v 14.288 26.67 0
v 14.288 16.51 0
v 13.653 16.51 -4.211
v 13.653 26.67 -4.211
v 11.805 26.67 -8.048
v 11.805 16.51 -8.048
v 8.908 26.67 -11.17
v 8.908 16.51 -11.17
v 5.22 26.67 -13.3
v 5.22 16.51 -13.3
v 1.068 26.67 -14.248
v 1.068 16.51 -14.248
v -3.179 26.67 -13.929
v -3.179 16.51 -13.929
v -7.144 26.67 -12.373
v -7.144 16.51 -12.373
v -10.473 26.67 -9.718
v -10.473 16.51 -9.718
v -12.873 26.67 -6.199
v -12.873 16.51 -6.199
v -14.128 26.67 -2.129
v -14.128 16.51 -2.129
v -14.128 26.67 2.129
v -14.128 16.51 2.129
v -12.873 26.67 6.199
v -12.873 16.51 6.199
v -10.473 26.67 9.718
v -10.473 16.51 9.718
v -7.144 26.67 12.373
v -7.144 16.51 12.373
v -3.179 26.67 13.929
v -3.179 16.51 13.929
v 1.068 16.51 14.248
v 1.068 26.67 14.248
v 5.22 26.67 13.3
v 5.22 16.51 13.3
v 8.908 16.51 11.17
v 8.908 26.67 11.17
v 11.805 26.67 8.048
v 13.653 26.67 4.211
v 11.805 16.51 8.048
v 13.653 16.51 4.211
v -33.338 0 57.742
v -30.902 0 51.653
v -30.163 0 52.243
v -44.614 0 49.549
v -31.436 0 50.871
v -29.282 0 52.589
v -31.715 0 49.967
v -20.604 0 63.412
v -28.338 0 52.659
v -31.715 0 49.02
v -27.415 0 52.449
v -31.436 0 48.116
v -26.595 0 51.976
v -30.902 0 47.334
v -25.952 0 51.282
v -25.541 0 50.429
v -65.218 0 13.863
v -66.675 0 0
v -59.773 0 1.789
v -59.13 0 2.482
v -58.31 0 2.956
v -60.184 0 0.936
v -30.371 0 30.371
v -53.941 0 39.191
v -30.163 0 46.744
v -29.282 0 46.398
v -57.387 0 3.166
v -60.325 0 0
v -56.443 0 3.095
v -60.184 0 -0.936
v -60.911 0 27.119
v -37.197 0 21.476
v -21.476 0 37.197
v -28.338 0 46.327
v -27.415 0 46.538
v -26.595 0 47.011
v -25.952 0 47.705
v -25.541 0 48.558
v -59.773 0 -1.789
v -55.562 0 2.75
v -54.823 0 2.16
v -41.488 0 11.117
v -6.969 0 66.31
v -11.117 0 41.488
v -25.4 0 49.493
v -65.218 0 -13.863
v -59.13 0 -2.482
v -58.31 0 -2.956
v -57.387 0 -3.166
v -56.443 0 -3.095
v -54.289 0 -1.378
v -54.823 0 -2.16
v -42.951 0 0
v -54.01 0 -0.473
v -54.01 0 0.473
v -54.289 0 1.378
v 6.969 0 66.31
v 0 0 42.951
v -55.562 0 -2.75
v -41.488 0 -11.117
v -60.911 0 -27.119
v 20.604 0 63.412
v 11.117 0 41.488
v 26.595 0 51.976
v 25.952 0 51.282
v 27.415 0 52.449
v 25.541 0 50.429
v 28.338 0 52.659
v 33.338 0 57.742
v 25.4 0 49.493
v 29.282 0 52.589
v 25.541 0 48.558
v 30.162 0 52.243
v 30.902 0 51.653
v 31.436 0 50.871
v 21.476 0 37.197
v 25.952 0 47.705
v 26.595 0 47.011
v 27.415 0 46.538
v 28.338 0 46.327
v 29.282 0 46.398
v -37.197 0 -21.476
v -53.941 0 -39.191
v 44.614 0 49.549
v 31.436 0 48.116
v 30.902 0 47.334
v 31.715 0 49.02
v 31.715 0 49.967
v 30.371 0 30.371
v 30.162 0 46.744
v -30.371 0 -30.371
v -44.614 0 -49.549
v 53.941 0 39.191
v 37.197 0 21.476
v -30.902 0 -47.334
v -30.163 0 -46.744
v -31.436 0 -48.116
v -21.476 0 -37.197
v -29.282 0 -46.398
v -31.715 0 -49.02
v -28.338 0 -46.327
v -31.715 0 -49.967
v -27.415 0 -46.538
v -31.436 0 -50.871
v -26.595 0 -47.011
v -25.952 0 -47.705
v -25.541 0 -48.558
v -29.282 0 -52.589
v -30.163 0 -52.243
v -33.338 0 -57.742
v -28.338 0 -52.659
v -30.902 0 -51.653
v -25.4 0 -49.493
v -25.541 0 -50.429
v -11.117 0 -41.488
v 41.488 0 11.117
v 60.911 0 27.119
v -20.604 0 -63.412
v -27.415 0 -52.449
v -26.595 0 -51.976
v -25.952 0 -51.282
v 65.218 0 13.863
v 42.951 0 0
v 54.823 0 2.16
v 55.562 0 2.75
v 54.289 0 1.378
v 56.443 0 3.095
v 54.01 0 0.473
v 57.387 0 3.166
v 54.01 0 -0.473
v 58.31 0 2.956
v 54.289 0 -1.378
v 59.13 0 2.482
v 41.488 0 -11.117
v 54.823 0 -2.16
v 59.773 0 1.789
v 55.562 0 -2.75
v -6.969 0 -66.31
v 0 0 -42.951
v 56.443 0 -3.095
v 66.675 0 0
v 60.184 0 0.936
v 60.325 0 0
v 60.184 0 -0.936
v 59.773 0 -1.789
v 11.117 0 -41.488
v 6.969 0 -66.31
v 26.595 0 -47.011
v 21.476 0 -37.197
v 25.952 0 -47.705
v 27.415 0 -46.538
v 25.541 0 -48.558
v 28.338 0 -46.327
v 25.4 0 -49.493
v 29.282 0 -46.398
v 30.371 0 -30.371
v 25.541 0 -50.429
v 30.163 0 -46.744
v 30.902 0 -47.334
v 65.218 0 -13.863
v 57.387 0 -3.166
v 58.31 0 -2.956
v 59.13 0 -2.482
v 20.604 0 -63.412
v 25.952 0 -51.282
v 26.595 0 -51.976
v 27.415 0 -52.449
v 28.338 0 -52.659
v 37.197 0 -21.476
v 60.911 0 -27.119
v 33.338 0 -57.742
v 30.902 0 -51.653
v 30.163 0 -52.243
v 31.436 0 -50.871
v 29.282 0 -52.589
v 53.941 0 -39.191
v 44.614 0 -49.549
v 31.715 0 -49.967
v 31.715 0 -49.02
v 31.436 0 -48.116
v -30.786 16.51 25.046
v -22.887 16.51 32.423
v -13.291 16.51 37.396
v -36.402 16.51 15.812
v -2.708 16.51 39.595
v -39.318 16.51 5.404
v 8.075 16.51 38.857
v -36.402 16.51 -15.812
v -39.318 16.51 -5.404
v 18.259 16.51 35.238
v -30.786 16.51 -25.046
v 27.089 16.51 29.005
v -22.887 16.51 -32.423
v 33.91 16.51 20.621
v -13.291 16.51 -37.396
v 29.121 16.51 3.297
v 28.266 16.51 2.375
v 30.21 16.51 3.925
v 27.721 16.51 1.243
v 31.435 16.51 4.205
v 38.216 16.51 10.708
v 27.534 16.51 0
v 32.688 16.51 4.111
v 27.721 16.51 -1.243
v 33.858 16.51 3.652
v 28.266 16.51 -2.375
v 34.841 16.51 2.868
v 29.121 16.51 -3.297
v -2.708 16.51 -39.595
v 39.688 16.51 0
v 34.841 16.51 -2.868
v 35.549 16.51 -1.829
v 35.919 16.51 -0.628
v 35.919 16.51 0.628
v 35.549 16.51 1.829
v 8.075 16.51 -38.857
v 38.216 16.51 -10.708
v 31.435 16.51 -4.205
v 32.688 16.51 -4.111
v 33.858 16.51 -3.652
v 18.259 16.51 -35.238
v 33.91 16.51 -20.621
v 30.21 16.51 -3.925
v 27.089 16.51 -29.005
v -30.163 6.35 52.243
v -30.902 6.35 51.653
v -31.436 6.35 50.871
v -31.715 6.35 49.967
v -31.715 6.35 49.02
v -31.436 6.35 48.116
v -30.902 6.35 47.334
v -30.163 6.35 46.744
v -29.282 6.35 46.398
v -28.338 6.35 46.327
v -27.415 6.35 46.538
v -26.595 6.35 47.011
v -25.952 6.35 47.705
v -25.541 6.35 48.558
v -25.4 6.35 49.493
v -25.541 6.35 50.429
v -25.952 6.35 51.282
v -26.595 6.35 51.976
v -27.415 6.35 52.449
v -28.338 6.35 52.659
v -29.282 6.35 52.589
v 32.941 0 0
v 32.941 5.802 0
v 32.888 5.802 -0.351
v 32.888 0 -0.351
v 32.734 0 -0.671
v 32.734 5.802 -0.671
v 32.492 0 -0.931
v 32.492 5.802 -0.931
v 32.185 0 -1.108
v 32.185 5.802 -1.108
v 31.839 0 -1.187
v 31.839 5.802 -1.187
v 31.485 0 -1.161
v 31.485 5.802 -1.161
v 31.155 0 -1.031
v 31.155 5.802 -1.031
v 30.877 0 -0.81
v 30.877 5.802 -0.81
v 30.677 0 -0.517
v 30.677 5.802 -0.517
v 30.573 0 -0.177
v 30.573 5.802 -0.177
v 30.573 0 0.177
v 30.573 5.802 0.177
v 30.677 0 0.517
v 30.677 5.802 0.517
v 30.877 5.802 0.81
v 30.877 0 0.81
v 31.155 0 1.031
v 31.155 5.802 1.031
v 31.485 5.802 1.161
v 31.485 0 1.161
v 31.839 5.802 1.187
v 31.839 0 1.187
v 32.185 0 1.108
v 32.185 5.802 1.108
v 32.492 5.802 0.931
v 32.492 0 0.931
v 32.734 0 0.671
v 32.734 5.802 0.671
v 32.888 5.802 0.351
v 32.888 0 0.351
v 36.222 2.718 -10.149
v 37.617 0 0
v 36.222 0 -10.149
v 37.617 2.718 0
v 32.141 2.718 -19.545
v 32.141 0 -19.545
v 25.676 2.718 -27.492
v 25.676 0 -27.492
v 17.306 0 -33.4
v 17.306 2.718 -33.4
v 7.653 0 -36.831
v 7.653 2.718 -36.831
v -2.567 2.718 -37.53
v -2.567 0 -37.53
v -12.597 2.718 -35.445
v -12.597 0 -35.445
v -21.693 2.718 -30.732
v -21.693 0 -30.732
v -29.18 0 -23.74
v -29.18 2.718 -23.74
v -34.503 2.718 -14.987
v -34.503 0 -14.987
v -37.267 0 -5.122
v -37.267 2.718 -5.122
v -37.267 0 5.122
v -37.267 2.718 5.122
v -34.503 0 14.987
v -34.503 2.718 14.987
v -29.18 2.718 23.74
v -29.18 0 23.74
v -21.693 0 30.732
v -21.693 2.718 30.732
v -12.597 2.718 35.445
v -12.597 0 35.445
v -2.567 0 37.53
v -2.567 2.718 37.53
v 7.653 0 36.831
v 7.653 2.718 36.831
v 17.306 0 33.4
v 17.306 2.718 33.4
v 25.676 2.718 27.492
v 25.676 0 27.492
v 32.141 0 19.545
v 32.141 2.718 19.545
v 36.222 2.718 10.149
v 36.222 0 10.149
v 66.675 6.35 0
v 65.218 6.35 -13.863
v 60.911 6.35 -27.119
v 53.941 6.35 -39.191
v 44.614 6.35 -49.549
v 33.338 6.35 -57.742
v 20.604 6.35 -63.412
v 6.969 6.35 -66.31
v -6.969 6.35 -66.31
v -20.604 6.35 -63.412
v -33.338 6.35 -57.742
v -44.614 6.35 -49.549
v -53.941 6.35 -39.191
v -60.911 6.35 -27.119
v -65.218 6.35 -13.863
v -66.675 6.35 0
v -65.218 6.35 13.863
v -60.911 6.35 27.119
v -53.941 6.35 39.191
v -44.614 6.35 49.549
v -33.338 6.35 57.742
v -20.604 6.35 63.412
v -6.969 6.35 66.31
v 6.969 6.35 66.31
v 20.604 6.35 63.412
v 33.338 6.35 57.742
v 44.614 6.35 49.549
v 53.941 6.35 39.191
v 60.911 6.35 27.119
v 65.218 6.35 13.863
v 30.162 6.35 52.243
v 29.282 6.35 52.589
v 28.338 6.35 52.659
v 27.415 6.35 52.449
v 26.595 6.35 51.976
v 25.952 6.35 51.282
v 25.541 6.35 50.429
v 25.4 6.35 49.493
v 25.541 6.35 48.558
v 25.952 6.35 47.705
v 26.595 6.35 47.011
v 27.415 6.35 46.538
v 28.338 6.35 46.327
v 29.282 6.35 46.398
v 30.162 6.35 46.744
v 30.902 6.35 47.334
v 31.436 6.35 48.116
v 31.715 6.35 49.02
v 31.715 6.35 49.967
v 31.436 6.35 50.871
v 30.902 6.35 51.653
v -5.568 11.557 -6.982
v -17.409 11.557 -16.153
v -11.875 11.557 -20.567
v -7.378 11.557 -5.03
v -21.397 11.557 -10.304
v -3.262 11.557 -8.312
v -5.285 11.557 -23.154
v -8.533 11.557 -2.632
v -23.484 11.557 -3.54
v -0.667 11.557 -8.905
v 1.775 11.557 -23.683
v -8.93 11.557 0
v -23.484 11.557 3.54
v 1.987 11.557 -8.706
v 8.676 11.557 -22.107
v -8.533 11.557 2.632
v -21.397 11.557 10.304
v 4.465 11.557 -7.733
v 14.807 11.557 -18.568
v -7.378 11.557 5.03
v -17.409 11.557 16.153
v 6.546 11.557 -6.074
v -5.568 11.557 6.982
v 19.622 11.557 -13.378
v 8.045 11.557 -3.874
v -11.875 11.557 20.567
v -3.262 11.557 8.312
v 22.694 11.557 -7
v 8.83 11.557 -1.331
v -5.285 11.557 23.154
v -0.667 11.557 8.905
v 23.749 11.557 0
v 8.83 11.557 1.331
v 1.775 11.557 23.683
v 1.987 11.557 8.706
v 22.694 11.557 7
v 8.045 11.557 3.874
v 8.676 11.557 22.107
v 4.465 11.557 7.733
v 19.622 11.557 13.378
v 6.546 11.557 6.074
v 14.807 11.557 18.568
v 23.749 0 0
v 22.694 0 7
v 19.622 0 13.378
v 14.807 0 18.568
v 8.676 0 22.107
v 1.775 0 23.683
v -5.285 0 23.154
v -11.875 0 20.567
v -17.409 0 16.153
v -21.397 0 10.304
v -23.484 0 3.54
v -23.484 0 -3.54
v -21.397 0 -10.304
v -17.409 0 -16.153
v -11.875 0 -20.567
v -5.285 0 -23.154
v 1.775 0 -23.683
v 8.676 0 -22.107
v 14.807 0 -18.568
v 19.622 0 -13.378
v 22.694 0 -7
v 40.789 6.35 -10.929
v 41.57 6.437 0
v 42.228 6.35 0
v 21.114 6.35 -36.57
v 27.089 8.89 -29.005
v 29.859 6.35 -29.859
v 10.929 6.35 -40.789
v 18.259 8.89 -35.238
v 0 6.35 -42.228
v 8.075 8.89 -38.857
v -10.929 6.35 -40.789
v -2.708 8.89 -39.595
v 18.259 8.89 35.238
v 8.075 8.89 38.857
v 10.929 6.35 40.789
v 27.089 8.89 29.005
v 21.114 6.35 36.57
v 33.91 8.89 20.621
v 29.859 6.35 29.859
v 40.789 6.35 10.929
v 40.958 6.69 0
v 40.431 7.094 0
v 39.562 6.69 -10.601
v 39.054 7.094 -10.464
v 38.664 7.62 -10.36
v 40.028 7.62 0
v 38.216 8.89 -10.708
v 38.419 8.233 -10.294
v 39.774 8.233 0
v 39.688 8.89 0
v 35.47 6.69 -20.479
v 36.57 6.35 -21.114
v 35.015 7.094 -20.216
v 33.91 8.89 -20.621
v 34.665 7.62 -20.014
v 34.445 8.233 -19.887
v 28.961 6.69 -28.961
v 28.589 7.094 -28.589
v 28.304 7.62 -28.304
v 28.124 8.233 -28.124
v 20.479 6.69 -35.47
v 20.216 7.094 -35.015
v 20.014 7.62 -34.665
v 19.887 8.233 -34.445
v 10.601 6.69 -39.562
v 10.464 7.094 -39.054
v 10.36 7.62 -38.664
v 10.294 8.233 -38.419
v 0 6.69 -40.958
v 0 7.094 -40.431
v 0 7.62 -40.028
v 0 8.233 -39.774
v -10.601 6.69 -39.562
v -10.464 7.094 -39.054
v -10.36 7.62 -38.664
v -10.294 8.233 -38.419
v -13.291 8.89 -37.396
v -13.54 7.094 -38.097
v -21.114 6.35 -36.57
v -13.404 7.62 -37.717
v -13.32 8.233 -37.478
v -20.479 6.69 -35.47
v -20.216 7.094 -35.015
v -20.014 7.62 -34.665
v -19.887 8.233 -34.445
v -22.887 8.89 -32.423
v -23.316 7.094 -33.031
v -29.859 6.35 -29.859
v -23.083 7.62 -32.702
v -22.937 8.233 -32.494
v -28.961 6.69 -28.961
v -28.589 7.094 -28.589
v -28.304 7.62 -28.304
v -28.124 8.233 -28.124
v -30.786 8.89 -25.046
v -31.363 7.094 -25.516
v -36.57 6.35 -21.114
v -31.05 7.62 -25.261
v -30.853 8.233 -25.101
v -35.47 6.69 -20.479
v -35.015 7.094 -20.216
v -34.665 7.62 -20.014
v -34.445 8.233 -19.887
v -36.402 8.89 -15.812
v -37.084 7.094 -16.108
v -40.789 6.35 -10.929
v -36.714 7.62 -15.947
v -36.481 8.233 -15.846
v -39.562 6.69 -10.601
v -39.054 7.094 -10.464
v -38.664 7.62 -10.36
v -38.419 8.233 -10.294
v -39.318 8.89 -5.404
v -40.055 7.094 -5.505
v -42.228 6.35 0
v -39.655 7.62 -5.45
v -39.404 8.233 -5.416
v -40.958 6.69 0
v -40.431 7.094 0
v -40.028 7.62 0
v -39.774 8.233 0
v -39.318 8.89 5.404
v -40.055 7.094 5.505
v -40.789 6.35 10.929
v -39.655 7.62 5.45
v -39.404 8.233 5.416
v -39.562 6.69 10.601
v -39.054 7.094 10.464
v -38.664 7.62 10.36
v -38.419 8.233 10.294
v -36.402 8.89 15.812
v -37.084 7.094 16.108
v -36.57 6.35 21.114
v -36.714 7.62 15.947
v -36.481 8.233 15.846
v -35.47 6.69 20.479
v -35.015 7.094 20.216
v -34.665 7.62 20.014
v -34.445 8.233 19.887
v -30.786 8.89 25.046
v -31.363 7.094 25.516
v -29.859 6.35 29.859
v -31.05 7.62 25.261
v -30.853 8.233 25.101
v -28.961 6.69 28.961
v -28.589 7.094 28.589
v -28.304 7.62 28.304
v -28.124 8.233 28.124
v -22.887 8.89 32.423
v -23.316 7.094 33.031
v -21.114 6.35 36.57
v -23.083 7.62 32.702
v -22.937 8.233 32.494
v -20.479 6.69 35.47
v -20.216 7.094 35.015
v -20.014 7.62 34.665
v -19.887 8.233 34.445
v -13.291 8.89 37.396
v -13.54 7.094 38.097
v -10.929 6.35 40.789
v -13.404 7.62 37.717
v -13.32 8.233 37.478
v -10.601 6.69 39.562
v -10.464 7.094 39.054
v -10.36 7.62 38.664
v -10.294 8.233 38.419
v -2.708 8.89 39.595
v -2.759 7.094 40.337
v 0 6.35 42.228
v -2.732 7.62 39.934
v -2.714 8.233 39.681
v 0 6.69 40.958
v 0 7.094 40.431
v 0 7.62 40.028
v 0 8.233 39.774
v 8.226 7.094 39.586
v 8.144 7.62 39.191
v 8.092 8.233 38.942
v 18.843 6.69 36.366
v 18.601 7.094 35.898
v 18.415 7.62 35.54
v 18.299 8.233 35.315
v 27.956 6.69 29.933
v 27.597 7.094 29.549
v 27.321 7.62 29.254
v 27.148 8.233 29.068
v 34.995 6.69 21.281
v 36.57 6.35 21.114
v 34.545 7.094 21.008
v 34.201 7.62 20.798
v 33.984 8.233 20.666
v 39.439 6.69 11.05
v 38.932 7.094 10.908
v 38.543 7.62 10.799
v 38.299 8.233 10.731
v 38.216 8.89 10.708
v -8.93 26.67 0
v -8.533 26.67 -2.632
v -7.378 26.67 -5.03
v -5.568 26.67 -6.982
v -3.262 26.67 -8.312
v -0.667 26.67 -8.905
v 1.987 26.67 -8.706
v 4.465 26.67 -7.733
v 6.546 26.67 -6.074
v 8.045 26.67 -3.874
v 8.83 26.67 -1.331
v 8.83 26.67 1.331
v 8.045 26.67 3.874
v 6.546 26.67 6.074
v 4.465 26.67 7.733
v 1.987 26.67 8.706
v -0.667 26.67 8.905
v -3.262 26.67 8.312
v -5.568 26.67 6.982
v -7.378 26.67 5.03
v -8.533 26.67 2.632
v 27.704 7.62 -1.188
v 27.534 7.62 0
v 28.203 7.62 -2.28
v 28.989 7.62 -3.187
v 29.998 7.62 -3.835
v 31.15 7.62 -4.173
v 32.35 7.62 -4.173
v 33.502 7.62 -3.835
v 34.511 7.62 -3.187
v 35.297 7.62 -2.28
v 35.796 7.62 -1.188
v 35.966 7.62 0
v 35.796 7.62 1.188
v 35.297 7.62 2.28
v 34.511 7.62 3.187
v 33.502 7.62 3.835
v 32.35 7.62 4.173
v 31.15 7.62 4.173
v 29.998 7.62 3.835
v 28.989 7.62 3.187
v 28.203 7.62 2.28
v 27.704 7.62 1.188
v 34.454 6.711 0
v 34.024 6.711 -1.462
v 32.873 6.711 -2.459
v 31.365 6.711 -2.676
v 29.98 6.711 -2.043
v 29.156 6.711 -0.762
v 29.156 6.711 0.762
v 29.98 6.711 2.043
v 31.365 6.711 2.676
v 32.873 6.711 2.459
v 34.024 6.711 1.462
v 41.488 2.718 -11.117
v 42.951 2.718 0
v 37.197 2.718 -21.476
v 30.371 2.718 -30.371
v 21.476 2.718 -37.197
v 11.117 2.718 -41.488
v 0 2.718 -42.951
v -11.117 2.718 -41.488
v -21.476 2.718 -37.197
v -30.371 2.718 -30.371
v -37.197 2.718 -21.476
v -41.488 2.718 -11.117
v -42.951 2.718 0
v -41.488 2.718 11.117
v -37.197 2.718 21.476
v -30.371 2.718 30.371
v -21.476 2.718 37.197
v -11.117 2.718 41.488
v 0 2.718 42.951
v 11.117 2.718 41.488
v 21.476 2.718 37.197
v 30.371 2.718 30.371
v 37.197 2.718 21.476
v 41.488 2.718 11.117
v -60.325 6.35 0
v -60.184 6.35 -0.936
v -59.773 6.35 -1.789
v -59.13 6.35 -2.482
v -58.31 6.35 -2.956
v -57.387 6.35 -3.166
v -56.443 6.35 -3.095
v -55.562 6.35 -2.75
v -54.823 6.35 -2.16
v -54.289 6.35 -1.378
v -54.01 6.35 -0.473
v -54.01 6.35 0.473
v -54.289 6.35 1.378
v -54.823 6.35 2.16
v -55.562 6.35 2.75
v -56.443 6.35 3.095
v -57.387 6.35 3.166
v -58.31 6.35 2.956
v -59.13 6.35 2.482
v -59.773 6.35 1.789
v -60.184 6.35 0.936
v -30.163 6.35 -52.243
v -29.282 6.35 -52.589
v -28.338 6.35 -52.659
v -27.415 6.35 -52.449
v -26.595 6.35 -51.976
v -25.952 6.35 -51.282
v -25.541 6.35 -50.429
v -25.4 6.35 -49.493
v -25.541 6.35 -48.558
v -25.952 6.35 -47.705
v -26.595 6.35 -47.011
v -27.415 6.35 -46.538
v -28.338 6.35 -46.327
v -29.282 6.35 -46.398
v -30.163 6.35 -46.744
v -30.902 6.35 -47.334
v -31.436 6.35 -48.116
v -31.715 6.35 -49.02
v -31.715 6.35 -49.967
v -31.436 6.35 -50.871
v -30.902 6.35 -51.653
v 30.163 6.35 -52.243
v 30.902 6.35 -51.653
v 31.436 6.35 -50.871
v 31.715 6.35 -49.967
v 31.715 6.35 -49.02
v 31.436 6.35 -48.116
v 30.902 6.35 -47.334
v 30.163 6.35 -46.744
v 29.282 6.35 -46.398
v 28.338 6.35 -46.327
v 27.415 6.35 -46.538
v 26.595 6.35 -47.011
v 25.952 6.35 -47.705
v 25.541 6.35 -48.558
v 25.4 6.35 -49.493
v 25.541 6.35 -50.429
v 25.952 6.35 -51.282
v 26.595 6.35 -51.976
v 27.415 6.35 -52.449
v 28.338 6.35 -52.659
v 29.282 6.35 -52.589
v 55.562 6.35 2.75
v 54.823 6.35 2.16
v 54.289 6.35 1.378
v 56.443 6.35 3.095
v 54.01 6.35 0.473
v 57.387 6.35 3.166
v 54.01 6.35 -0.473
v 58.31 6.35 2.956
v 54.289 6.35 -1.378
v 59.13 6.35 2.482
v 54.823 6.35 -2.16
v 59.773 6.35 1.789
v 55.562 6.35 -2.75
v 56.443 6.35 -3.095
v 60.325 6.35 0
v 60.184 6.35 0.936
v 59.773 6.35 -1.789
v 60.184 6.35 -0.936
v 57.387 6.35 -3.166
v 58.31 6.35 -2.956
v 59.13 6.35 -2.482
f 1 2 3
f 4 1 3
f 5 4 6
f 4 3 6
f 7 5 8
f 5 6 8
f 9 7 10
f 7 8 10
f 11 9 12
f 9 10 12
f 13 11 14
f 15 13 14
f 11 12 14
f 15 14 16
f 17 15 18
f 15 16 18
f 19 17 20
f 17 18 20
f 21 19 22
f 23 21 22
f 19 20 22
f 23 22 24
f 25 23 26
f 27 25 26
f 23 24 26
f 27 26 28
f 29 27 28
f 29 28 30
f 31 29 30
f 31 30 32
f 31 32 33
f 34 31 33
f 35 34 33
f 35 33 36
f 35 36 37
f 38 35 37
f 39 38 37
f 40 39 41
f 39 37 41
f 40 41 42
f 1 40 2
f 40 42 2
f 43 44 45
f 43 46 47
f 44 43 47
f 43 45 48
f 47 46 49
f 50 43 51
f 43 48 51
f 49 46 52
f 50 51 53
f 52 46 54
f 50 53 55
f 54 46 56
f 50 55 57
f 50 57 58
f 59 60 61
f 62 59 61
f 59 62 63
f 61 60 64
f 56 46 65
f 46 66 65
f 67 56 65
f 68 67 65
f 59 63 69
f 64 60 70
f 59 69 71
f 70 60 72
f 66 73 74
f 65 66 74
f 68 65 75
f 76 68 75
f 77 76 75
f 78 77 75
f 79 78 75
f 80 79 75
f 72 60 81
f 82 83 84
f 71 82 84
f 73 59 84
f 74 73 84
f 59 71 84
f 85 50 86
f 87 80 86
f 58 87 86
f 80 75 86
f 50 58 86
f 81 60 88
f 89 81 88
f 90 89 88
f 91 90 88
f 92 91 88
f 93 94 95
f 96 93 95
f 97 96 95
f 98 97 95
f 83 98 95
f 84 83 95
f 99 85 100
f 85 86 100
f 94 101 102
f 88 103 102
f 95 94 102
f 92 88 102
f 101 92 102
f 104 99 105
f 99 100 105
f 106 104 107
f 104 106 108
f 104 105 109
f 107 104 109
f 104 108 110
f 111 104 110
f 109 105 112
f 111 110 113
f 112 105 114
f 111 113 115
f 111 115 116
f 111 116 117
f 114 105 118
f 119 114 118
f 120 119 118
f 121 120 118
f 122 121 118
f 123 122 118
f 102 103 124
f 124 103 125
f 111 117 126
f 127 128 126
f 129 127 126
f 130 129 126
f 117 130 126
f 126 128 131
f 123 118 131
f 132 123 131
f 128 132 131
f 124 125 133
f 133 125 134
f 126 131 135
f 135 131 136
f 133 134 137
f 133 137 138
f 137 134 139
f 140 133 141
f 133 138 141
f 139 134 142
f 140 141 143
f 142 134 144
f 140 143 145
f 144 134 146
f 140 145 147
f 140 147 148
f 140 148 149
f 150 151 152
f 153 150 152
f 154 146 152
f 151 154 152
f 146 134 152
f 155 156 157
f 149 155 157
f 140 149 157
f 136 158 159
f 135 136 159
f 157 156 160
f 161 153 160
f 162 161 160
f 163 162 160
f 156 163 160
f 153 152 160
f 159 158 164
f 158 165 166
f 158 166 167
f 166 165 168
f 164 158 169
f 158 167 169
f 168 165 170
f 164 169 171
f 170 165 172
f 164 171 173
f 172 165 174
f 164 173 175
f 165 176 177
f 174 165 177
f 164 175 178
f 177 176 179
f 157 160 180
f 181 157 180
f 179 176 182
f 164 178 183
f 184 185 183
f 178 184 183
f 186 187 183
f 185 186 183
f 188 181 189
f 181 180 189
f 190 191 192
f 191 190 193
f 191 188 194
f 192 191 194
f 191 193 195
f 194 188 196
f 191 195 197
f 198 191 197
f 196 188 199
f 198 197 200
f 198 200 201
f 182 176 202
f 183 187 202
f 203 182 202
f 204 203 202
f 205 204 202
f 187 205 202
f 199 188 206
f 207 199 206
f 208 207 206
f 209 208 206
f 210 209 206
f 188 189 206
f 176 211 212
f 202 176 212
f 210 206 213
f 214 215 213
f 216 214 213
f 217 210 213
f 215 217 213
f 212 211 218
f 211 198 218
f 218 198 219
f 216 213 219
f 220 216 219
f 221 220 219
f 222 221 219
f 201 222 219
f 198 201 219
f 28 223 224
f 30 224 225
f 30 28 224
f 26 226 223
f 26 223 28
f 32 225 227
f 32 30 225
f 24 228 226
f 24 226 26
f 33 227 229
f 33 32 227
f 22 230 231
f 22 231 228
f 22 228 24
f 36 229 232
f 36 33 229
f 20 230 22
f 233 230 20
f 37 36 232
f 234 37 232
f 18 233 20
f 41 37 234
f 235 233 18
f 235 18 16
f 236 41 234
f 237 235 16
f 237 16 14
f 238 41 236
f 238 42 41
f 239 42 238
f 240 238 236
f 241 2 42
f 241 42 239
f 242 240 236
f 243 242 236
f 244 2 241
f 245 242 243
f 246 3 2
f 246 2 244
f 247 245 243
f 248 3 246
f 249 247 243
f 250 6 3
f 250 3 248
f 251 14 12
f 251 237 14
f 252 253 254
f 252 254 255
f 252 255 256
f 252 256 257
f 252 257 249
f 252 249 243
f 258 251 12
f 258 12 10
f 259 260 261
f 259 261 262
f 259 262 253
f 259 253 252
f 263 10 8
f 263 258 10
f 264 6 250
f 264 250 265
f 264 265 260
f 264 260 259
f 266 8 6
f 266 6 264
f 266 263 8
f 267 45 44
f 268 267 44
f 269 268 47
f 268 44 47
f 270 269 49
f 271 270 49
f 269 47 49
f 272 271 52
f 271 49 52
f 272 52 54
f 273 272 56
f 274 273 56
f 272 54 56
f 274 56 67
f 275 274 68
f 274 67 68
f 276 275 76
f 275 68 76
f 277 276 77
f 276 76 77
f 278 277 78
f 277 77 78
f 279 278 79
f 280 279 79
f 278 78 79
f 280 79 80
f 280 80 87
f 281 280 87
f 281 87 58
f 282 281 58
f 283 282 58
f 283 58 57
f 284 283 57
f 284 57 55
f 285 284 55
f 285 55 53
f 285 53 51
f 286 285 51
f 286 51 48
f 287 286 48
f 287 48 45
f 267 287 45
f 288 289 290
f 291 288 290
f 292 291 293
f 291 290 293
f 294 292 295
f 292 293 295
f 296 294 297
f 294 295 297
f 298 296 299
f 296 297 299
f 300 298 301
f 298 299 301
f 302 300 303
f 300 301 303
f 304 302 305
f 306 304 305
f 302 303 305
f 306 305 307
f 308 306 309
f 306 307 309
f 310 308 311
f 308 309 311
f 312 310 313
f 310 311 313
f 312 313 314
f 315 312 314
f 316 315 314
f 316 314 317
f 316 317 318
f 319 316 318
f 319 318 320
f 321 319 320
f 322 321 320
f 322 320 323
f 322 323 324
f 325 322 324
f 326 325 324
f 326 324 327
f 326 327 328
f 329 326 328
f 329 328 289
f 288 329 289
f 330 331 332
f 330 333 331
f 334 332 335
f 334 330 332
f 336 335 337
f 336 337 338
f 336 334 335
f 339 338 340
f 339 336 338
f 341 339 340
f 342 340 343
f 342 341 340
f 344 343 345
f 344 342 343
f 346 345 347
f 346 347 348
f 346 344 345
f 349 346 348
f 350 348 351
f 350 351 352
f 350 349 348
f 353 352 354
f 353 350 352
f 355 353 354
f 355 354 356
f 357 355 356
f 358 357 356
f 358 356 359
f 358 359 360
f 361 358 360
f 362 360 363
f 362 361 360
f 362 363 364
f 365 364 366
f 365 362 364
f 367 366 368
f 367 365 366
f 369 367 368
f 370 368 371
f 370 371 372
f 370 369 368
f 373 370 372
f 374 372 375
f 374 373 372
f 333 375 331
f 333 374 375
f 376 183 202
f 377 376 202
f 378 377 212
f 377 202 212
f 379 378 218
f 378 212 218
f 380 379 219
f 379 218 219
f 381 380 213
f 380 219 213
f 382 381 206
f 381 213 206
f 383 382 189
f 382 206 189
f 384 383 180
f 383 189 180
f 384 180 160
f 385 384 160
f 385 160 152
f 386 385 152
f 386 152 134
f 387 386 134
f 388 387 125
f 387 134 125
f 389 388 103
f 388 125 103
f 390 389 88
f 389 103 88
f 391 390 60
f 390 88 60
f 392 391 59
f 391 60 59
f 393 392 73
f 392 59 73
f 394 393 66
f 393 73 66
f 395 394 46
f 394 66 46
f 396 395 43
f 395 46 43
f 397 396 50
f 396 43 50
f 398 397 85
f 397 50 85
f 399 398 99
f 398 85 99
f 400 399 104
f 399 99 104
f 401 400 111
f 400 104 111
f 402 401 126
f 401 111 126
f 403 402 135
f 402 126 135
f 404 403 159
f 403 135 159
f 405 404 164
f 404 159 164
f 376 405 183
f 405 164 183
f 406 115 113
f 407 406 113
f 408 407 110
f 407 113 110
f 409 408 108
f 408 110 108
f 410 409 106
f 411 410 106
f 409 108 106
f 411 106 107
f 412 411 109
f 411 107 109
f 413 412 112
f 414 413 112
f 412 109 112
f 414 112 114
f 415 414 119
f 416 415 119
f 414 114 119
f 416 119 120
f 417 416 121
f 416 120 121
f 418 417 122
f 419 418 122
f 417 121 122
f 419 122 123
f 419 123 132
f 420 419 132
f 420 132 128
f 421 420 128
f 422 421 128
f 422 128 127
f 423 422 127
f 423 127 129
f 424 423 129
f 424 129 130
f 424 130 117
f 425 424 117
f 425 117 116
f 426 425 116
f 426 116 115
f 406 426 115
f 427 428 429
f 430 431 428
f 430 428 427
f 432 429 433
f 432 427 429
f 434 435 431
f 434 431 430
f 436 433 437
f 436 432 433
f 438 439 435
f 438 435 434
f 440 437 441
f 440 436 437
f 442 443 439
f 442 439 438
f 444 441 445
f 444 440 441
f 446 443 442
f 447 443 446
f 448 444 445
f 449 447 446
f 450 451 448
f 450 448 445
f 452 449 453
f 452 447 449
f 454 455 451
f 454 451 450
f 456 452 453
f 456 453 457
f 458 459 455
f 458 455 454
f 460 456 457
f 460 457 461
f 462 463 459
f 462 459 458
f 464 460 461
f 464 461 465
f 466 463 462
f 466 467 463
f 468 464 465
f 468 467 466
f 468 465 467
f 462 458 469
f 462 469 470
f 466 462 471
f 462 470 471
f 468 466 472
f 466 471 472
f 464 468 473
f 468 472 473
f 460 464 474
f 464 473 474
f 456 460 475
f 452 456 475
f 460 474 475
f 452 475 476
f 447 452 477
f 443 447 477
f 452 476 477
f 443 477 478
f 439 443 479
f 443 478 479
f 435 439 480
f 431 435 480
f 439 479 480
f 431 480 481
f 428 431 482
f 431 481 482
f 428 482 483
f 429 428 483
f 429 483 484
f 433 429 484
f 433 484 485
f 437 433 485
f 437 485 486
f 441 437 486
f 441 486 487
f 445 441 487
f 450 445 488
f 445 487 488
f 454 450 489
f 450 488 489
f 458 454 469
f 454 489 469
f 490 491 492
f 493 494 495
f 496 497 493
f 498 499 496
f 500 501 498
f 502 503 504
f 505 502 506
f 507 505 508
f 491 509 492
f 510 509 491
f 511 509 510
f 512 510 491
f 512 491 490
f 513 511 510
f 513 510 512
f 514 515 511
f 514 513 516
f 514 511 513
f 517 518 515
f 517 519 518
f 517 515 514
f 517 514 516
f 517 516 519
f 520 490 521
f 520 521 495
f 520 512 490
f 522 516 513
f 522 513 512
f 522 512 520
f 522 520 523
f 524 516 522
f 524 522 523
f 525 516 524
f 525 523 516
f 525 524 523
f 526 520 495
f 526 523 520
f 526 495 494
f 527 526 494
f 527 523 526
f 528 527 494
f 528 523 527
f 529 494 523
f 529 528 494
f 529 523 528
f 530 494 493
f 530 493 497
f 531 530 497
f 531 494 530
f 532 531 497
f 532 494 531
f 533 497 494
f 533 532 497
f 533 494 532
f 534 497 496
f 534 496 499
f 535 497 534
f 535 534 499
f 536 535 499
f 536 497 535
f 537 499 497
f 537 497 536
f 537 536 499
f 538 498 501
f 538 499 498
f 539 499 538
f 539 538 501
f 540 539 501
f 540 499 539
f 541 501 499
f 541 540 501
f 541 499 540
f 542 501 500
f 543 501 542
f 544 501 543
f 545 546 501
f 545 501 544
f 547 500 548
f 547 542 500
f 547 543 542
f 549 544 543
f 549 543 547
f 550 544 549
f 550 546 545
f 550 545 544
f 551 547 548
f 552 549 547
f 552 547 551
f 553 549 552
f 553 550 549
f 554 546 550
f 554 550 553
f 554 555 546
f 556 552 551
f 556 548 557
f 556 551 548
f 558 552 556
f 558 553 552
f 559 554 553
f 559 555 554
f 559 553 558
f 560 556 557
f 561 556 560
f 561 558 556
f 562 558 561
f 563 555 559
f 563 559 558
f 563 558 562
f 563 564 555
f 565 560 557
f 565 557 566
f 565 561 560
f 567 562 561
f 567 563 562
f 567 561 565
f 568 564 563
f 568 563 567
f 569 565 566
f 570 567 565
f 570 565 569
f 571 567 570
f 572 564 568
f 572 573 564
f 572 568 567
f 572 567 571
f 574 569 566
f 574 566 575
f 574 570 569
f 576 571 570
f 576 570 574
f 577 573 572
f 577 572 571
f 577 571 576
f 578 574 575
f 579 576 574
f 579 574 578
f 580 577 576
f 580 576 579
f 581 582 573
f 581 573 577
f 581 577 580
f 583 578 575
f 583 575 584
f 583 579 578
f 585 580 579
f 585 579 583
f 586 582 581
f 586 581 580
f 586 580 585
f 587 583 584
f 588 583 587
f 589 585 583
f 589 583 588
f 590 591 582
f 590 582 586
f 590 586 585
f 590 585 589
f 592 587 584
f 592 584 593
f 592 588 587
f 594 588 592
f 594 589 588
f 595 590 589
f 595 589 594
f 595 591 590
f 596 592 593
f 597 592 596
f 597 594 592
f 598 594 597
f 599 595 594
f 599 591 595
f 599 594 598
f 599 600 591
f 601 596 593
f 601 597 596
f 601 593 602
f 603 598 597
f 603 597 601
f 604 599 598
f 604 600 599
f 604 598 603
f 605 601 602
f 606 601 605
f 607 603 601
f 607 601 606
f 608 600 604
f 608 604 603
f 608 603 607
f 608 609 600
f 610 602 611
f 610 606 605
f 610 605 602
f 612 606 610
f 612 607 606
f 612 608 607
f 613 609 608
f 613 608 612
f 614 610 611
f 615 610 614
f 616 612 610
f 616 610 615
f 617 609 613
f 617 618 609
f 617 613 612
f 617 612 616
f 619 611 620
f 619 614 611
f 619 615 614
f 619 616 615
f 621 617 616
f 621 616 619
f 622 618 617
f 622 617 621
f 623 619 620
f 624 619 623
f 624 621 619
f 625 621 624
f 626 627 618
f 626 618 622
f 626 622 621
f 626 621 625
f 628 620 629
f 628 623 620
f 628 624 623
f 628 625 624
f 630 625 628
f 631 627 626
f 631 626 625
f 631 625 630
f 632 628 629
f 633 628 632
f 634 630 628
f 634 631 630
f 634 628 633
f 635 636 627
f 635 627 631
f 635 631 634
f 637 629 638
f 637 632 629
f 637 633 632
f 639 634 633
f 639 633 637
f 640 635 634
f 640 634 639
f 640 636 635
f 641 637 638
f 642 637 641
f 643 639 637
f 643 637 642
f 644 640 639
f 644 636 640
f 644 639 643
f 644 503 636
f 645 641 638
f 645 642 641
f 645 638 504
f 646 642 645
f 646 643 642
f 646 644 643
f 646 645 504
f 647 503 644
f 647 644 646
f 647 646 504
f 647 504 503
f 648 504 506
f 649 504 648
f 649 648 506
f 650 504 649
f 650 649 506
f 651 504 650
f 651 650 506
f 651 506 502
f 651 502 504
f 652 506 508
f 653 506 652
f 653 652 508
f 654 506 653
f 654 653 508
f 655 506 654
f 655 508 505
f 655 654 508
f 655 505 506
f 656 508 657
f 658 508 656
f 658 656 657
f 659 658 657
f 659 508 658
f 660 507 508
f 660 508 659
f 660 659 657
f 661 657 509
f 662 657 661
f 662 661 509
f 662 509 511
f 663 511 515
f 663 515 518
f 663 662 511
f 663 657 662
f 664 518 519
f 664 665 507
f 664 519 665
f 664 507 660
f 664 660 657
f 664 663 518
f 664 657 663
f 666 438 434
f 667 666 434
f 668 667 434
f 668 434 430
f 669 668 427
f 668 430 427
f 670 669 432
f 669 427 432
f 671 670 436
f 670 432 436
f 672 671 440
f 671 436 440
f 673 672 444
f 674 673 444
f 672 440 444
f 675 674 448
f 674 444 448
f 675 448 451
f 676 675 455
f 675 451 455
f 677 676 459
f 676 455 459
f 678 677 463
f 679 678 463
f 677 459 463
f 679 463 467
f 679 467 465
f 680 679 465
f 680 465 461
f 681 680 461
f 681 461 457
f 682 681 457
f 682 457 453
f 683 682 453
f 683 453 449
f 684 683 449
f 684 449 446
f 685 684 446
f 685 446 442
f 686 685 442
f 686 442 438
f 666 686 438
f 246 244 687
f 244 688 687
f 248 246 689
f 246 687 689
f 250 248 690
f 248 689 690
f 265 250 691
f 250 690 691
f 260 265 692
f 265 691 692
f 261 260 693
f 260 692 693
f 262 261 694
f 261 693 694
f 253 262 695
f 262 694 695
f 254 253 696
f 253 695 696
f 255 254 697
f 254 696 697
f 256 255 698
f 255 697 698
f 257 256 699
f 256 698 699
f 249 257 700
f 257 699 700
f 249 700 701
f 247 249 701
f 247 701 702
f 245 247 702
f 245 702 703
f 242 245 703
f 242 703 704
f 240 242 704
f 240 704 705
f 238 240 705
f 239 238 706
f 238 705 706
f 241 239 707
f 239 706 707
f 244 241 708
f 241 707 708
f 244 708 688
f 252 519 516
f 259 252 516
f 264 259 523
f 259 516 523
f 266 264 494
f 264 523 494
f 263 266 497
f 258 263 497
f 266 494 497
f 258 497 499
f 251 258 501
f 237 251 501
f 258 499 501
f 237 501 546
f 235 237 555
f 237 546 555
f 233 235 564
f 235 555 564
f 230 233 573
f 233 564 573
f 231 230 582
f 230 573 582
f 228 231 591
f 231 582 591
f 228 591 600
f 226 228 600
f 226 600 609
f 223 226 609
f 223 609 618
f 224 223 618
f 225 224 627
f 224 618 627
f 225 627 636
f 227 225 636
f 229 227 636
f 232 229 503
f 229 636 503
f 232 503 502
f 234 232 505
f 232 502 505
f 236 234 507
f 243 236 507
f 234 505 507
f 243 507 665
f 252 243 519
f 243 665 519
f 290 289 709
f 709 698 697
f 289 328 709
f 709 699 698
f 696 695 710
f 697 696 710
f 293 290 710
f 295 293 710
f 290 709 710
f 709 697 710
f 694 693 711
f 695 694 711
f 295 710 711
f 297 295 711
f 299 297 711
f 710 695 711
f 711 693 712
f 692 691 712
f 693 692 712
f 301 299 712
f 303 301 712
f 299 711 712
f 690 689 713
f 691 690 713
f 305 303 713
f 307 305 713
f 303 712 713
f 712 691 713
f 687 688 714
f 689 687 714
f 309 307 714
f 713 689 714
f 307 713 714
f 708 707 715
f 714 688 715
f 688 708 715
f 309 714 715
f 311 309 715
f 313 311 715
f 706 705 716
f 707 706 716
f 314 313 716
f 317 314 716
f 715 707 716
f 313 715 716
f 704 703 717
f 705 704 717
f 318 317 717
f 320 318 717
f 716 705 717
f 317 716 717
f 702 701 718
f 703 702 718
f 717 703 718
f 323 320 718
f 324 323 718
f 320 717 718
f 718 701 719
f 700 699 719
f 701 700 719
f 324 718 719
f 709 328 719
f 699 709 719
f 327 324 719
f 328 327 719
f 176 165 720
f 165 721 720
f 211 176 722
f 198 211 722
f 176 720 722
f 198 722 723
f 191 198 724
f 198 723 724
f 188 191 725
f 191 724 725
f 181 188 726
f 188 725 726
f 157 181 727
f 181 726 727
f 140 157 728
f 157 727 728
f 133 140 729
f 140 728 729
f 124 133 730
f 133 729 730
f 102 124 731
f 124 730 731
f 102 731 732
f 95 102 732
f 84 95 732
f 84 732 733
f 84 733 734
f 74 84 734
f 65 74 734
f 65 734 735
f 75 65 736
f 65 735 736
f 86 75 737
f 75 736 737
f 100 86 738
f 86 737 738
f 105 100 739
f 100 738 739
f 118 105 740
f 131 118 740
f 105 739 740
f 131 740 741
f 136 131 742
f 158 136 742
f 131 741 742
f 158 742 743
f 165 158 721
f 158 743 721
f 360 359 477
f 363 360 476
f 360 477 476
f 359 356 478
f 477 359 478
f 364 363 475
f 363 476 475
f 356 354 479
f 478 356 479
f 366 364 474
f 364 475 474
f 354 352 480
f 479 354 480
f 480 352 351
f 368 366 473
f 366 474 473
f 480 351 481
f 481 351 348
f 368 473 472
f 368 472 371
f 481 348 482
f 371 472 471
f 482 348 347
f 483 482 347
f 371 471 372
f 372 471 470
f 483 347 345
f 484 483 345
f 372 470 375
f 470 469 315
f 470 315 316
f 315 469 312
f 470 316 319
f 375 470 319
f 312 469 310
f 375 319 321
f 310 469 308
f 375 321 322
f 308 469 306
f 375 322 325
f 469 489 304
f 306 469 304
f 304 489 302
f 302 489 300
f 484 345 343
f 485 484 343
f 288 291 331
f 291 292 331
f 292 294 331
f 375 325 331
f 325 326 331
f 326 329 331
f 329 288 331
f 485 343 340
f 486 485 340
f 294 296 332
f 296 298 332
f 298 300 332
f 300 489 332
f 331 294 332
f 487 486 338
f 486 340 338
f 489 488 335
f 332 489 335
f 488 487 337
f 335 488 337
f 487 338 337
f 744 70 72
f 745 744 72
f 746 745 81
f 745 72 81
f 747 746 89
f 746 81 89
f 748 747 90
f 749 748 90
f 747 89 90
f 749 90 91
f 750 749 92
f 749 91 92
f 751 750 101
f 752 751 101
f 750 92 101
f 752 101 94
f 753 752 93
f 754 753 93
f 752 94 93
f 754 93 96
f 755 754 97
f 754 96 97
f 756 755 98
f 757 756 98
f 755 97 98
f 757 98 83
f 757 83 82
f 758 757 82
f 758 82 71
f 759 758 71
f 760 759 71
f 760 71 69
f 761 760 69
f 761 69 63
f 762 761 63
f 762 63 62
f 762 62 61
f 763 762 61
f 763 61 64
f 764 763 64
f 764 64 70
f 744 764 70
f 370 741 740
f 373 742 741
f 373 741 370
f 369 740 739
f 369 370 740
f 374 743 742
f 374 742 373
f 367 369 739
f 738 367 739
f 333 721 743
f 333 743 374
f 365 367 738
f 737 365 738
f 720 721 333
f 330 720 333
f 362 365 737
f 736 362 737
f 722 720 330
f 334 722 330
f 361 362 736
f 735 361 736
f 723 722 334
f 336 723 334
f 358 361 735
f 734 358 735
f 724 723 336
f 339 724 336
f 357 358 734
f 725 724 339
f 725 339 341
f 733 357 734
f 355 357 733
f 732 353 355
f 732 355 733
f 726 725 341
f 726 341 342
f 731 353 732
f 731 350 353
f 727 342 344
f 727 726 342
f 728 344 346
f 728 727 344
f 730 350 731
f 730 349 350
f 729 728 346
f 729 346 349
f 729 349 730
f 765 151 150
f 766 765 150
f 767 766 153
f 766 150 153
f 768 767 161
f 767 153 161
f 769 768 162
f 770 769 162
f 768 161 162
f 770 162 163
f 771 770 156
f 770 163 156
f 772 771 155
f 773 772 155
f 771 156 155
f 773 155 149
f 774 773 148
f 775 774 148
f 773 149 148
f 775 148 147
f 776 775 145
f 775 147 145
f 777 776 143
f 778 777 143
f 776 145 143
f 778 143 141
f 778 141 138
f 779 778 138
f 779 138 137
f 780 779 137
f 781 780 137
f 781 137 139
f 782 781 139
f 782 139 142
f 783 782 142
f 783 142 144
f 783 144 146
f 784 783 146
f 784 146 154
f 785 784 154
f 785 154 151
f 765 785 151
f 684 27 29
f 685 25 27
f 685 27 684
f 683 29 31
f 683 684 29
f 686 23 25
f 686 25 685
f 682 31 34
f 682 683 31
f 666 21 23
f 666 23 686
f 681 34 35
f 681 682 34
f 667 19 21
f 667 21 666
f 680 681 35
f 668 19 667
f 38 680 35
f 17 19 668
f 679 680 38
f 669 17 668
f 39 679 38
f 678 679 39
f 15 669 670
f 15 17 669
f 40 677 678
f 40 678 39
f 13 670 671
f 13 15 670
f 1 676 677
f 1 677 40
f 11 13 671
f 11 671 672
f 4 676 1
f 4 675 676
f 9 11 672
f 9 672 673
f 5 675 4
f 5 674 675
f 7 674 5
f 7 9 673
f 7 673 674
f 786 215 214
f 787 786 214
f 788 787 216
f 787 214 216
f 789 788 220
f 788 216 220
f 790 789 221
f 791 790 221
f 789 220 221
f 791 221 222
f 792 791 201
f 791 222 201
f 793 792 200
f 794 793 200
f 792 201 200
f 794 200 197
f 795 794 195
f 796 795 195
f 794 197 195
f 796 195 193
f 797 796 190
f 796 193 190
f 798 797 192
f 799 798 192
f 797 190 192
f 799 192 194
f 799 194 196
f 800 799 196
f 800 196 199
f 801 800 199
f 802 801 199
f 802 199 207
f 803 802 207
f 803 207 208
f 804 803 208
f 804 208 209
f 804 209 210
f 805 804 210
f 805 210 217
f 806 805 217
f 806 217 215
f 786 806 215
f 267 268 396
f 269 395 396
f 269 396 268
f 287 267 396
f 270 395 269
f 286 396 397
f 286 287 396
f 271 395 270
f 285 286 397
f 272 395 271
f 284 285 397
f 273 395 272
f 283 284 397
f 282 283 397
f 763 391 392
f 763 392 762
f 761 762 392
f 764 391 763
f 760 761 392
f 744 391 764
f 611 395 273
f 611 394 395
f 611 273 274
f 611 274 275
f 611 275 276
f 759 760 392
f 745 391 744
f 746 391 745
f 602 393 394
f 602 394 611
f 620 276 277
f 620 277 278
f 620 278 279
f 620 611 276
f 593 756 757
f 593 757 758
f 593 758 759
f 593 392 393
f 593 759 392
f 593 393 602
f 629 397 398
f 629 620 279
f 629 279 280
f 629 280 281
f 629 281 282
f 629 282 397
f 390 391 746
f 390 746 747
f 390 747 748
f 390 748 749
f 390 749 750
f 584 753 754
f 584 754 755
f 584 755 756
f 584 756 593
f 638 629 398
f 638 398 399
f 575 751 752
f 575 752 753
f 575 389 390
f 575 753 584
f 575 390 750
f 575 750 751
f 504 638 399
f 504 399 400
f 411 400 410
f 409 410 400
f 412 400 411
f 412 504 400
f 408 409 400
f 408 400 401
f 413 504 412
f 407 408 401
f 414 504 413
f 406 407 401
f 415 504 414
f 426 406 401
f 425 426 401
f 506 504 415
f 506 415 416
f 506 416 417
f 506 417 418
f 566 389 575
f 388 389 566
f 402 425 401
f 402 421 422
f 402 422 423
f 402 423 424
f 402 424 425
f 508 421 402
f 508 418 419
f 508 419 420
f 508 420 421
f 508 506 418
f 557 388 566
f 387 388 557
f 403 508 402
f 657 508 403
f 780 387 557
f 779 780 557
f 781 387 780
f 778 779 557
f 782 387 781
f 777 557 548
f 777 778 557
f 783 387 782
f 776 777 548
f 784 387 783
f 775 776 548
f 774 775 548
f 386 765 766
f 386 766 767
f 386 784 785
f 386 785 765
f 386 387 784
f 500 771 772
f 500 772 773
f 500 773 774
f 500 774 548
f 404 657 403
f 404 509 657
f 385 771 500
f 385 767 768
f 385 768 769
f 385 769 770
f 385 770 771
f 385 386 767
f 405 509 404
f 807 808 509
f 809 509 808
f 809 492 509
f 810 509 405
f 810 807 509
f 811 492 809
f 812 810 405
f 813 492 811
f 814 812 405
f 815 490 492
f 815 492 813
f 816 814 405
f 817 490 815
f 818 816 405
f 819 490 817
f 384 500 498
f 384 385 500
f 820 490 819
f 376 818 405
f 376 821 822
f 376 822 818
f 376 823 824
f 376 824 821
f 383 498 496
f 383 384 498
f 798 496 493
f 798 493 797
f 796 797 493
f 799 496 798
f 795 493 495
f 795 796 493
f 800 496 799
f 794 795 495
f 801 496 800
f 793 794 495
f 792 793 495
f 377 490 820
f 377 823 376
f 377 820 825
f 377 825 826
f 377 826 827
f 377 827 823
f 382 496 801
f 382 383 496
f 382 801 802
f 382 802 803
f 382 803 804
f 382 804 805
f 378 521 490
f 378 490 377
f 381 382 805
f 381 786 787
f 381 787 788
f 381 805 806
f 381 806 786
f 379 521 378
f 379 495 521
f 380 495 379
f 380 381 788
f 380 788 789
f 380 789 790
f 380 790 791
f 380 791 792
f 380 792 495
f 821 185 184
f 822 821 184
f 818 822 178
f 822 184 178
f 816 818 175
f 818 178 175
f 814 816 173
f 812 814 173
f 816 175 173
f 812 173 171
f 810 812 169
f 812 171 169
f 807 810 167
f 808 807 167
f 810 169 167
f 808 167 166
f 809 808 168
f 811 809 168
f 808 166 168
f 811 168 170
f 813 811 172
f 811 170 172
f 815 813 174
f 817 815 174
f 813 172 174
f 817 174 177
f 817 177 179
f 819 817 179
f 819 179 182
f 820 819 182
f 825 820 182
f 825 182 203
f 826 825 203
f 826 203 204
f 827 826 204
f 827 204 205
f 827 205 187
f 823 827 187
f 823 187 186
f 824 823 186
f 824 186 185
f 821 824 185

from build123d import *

# Parameters (mm, degrees)
SKETCH1_R                            = 66.675
BOSS_EXTRUDE1_DEPTH                  = 6.35
SKETCH2_R                            = 39.6875
BOSS_EXTRUDE2_DEPTH                  = 10.16
FILLET1_R                            = 2.54
SKETCH5_R                            = 23.749
CUT_EXTRUDE1_DEPTH                   = 11.557
F_1_4_0_25_DIAMETER_HOLE1_D          = 6.35
F_1_4_0_25_DIAMETER_HOLE1_DEPTH      = 6.351
CIRPATTERN1_COUNT                    = 6
SKETCH8_W                            = 5.334
SKETCH8_H                            = 2.7178
Q_0_332_DIAMETER_HOLE1_D             = 8.4328
Q_0_332_DIAMETER_HOLE1_DEPTH         = 8.89
Q_0_332_DIAMETER_HOLE1_TIP           = 2.533468714
F_3_32_0_09375_DIAMETER_HOLE1_D      = 2.38125
SKETCH16_R                           = 14.2875
BOSS_EXTRUDE3_DEPTH                  = 10.16
F_45_64_0_70313_DIAMETER_HOLE1_D     = 17.859502
F_45_64_0_70313_DIAMETER_HOLE1_DEPTH = 15.113


with BuildPart() as part:
    # Sketch1 → Boss-Extrude1 (new body)
    with BuildSketch(Plane(origin=(0, 0, 0), x_dir=(1, 0, 0), z_dir=(0, 1, 0))):
        Circle(SKETCH1_R)
    extrude(amount=BOSS_EXTRUDE1_DEPTH)

    # Sketch2 → Boss-Extrude2 (add)
    with BuildSketch(Plane(origin=(0, 6.35, 0), x_dir=(1, 0, 0), z_dir=(0, 1, 0))):
        Circle(SKETCH2_R)
    extrude(amount=BOSS_EXTRUDE2_DEPTH)

    # Fillet1
    fillet1_edges = [part.edges().sort_by_distance(p)[0] for p in [
        (-39.6875, 6.35, 0),
    ]]
    fillet(fillet1_edges, radius=FILLET1_R)

    # Sketch5 → Cut-Extrude1 (cut)
    with BuildSketch(Plane.XZ):
        Circle(SKETCH5_R)
    extrude(amount=-CUT_EXTRUDE1_DEPTH, mode=Mode.SUBTRACT)

    # 1/4 (0.25) Diameter Hole1
    with Locations(Plane(origin=(0, 6.35, 0), x_dir=(1, 0, 0), z_dir=(0, 1, 0))):
        with Locations((-57.15, 0)):
            f_1_4_0_25_diameter_hole1 = Hole(F_1_4_0_25_DIAMETER_HOLE1_D / 2, depth=F_1_4_0_25_DIAMETER_HOLE1_DEPTH)

    # CirPattern1: 1/4 (0.25) Diameter Hole1 ×6 about axis
    cirpattern1_axis = Axis((0, 0, 0), (0, 1, 0))
    for i in range(1, CIRPATTERN1_COUNT):
        add(f_1_4_0_25_diameter_hole1.rotate(cirpattern1_axis, i * 360 / CIRPATTERN1_COUNT), mode=Mode.SUBTRACT)

    # Sketch8 → Cut-Revolve1 (revolve, cut)
    with BuildSketch(Plane.XY):
        with Locations((40.2844, 1.3589)):
            Rectangle(SKETCH8_W, SKETCH8_H)
    revolve(axis=Axis((0, -1.27, 0), (0, 1, 0)), mode=Mode.SUBTRACT)

    # Q (0.332) Diameter Hole1
    with Locations(Plane(origin=(0, 16.51, 0), x_dir=(1, 0, 0), z_dir=(0, 1, 0))):
        with Locations((31.75, 0)):
            Hole(Q_0_332_DIAMETER_HOLE1_D / 2, depth=Q_0_332_DIAMETER_HOLE1_DEPTH)
            with Locations((0, 0, -(Q_0_332_DIAMETER_HOLE1_DEPTH + Q_0_332_DIAMETER_HOLE1_TIP / 2))):  # 118° drill point
                Cone(0, Q_0_332_DIAMETER_HOLE1_D / 2, Q_0_332_DIAMETER_HOLE1_TIP, mode=Mode.SUBTRACT)

    # 3/32 (0.09375) Diameter Hole1 (through all)
    with Locations(Plane(origin=(0, 0, 0), x_dir=(-1, 0, 0), z_dir=(0, -1, 0))):
        with Locations((-31.75, 0)):
            Hole(F_3_32_0_09375_DIAMETER_HOLE1_D / 2)

    # Sketch16 → Boss-Extrude3 (add)
    with BuildSketch(Plane(origin=(0, 16.51, 0), x_dir=(1, 0, 0), z_dir=(0, 1, 0))):
        Circle(SKETCH16_R)
    extrude(amount=BOSS_EXTRUDE3_DEPTH)

    # 45/64 (0.70313) Diameter Hole1
    with Locations(Plane(origin=(0, 26.67, 0), x_dir=(1, 0, 0), z_dir=(0, 1, 0))):
        with Locations((0, 0)):
            Hole(F_45_64_0_70313_DIAMETER_HOLE1_D / 2, depth=F_45_64_0_70313_DIAMETER_HOLE1_DEPTH)


solid = part.part
